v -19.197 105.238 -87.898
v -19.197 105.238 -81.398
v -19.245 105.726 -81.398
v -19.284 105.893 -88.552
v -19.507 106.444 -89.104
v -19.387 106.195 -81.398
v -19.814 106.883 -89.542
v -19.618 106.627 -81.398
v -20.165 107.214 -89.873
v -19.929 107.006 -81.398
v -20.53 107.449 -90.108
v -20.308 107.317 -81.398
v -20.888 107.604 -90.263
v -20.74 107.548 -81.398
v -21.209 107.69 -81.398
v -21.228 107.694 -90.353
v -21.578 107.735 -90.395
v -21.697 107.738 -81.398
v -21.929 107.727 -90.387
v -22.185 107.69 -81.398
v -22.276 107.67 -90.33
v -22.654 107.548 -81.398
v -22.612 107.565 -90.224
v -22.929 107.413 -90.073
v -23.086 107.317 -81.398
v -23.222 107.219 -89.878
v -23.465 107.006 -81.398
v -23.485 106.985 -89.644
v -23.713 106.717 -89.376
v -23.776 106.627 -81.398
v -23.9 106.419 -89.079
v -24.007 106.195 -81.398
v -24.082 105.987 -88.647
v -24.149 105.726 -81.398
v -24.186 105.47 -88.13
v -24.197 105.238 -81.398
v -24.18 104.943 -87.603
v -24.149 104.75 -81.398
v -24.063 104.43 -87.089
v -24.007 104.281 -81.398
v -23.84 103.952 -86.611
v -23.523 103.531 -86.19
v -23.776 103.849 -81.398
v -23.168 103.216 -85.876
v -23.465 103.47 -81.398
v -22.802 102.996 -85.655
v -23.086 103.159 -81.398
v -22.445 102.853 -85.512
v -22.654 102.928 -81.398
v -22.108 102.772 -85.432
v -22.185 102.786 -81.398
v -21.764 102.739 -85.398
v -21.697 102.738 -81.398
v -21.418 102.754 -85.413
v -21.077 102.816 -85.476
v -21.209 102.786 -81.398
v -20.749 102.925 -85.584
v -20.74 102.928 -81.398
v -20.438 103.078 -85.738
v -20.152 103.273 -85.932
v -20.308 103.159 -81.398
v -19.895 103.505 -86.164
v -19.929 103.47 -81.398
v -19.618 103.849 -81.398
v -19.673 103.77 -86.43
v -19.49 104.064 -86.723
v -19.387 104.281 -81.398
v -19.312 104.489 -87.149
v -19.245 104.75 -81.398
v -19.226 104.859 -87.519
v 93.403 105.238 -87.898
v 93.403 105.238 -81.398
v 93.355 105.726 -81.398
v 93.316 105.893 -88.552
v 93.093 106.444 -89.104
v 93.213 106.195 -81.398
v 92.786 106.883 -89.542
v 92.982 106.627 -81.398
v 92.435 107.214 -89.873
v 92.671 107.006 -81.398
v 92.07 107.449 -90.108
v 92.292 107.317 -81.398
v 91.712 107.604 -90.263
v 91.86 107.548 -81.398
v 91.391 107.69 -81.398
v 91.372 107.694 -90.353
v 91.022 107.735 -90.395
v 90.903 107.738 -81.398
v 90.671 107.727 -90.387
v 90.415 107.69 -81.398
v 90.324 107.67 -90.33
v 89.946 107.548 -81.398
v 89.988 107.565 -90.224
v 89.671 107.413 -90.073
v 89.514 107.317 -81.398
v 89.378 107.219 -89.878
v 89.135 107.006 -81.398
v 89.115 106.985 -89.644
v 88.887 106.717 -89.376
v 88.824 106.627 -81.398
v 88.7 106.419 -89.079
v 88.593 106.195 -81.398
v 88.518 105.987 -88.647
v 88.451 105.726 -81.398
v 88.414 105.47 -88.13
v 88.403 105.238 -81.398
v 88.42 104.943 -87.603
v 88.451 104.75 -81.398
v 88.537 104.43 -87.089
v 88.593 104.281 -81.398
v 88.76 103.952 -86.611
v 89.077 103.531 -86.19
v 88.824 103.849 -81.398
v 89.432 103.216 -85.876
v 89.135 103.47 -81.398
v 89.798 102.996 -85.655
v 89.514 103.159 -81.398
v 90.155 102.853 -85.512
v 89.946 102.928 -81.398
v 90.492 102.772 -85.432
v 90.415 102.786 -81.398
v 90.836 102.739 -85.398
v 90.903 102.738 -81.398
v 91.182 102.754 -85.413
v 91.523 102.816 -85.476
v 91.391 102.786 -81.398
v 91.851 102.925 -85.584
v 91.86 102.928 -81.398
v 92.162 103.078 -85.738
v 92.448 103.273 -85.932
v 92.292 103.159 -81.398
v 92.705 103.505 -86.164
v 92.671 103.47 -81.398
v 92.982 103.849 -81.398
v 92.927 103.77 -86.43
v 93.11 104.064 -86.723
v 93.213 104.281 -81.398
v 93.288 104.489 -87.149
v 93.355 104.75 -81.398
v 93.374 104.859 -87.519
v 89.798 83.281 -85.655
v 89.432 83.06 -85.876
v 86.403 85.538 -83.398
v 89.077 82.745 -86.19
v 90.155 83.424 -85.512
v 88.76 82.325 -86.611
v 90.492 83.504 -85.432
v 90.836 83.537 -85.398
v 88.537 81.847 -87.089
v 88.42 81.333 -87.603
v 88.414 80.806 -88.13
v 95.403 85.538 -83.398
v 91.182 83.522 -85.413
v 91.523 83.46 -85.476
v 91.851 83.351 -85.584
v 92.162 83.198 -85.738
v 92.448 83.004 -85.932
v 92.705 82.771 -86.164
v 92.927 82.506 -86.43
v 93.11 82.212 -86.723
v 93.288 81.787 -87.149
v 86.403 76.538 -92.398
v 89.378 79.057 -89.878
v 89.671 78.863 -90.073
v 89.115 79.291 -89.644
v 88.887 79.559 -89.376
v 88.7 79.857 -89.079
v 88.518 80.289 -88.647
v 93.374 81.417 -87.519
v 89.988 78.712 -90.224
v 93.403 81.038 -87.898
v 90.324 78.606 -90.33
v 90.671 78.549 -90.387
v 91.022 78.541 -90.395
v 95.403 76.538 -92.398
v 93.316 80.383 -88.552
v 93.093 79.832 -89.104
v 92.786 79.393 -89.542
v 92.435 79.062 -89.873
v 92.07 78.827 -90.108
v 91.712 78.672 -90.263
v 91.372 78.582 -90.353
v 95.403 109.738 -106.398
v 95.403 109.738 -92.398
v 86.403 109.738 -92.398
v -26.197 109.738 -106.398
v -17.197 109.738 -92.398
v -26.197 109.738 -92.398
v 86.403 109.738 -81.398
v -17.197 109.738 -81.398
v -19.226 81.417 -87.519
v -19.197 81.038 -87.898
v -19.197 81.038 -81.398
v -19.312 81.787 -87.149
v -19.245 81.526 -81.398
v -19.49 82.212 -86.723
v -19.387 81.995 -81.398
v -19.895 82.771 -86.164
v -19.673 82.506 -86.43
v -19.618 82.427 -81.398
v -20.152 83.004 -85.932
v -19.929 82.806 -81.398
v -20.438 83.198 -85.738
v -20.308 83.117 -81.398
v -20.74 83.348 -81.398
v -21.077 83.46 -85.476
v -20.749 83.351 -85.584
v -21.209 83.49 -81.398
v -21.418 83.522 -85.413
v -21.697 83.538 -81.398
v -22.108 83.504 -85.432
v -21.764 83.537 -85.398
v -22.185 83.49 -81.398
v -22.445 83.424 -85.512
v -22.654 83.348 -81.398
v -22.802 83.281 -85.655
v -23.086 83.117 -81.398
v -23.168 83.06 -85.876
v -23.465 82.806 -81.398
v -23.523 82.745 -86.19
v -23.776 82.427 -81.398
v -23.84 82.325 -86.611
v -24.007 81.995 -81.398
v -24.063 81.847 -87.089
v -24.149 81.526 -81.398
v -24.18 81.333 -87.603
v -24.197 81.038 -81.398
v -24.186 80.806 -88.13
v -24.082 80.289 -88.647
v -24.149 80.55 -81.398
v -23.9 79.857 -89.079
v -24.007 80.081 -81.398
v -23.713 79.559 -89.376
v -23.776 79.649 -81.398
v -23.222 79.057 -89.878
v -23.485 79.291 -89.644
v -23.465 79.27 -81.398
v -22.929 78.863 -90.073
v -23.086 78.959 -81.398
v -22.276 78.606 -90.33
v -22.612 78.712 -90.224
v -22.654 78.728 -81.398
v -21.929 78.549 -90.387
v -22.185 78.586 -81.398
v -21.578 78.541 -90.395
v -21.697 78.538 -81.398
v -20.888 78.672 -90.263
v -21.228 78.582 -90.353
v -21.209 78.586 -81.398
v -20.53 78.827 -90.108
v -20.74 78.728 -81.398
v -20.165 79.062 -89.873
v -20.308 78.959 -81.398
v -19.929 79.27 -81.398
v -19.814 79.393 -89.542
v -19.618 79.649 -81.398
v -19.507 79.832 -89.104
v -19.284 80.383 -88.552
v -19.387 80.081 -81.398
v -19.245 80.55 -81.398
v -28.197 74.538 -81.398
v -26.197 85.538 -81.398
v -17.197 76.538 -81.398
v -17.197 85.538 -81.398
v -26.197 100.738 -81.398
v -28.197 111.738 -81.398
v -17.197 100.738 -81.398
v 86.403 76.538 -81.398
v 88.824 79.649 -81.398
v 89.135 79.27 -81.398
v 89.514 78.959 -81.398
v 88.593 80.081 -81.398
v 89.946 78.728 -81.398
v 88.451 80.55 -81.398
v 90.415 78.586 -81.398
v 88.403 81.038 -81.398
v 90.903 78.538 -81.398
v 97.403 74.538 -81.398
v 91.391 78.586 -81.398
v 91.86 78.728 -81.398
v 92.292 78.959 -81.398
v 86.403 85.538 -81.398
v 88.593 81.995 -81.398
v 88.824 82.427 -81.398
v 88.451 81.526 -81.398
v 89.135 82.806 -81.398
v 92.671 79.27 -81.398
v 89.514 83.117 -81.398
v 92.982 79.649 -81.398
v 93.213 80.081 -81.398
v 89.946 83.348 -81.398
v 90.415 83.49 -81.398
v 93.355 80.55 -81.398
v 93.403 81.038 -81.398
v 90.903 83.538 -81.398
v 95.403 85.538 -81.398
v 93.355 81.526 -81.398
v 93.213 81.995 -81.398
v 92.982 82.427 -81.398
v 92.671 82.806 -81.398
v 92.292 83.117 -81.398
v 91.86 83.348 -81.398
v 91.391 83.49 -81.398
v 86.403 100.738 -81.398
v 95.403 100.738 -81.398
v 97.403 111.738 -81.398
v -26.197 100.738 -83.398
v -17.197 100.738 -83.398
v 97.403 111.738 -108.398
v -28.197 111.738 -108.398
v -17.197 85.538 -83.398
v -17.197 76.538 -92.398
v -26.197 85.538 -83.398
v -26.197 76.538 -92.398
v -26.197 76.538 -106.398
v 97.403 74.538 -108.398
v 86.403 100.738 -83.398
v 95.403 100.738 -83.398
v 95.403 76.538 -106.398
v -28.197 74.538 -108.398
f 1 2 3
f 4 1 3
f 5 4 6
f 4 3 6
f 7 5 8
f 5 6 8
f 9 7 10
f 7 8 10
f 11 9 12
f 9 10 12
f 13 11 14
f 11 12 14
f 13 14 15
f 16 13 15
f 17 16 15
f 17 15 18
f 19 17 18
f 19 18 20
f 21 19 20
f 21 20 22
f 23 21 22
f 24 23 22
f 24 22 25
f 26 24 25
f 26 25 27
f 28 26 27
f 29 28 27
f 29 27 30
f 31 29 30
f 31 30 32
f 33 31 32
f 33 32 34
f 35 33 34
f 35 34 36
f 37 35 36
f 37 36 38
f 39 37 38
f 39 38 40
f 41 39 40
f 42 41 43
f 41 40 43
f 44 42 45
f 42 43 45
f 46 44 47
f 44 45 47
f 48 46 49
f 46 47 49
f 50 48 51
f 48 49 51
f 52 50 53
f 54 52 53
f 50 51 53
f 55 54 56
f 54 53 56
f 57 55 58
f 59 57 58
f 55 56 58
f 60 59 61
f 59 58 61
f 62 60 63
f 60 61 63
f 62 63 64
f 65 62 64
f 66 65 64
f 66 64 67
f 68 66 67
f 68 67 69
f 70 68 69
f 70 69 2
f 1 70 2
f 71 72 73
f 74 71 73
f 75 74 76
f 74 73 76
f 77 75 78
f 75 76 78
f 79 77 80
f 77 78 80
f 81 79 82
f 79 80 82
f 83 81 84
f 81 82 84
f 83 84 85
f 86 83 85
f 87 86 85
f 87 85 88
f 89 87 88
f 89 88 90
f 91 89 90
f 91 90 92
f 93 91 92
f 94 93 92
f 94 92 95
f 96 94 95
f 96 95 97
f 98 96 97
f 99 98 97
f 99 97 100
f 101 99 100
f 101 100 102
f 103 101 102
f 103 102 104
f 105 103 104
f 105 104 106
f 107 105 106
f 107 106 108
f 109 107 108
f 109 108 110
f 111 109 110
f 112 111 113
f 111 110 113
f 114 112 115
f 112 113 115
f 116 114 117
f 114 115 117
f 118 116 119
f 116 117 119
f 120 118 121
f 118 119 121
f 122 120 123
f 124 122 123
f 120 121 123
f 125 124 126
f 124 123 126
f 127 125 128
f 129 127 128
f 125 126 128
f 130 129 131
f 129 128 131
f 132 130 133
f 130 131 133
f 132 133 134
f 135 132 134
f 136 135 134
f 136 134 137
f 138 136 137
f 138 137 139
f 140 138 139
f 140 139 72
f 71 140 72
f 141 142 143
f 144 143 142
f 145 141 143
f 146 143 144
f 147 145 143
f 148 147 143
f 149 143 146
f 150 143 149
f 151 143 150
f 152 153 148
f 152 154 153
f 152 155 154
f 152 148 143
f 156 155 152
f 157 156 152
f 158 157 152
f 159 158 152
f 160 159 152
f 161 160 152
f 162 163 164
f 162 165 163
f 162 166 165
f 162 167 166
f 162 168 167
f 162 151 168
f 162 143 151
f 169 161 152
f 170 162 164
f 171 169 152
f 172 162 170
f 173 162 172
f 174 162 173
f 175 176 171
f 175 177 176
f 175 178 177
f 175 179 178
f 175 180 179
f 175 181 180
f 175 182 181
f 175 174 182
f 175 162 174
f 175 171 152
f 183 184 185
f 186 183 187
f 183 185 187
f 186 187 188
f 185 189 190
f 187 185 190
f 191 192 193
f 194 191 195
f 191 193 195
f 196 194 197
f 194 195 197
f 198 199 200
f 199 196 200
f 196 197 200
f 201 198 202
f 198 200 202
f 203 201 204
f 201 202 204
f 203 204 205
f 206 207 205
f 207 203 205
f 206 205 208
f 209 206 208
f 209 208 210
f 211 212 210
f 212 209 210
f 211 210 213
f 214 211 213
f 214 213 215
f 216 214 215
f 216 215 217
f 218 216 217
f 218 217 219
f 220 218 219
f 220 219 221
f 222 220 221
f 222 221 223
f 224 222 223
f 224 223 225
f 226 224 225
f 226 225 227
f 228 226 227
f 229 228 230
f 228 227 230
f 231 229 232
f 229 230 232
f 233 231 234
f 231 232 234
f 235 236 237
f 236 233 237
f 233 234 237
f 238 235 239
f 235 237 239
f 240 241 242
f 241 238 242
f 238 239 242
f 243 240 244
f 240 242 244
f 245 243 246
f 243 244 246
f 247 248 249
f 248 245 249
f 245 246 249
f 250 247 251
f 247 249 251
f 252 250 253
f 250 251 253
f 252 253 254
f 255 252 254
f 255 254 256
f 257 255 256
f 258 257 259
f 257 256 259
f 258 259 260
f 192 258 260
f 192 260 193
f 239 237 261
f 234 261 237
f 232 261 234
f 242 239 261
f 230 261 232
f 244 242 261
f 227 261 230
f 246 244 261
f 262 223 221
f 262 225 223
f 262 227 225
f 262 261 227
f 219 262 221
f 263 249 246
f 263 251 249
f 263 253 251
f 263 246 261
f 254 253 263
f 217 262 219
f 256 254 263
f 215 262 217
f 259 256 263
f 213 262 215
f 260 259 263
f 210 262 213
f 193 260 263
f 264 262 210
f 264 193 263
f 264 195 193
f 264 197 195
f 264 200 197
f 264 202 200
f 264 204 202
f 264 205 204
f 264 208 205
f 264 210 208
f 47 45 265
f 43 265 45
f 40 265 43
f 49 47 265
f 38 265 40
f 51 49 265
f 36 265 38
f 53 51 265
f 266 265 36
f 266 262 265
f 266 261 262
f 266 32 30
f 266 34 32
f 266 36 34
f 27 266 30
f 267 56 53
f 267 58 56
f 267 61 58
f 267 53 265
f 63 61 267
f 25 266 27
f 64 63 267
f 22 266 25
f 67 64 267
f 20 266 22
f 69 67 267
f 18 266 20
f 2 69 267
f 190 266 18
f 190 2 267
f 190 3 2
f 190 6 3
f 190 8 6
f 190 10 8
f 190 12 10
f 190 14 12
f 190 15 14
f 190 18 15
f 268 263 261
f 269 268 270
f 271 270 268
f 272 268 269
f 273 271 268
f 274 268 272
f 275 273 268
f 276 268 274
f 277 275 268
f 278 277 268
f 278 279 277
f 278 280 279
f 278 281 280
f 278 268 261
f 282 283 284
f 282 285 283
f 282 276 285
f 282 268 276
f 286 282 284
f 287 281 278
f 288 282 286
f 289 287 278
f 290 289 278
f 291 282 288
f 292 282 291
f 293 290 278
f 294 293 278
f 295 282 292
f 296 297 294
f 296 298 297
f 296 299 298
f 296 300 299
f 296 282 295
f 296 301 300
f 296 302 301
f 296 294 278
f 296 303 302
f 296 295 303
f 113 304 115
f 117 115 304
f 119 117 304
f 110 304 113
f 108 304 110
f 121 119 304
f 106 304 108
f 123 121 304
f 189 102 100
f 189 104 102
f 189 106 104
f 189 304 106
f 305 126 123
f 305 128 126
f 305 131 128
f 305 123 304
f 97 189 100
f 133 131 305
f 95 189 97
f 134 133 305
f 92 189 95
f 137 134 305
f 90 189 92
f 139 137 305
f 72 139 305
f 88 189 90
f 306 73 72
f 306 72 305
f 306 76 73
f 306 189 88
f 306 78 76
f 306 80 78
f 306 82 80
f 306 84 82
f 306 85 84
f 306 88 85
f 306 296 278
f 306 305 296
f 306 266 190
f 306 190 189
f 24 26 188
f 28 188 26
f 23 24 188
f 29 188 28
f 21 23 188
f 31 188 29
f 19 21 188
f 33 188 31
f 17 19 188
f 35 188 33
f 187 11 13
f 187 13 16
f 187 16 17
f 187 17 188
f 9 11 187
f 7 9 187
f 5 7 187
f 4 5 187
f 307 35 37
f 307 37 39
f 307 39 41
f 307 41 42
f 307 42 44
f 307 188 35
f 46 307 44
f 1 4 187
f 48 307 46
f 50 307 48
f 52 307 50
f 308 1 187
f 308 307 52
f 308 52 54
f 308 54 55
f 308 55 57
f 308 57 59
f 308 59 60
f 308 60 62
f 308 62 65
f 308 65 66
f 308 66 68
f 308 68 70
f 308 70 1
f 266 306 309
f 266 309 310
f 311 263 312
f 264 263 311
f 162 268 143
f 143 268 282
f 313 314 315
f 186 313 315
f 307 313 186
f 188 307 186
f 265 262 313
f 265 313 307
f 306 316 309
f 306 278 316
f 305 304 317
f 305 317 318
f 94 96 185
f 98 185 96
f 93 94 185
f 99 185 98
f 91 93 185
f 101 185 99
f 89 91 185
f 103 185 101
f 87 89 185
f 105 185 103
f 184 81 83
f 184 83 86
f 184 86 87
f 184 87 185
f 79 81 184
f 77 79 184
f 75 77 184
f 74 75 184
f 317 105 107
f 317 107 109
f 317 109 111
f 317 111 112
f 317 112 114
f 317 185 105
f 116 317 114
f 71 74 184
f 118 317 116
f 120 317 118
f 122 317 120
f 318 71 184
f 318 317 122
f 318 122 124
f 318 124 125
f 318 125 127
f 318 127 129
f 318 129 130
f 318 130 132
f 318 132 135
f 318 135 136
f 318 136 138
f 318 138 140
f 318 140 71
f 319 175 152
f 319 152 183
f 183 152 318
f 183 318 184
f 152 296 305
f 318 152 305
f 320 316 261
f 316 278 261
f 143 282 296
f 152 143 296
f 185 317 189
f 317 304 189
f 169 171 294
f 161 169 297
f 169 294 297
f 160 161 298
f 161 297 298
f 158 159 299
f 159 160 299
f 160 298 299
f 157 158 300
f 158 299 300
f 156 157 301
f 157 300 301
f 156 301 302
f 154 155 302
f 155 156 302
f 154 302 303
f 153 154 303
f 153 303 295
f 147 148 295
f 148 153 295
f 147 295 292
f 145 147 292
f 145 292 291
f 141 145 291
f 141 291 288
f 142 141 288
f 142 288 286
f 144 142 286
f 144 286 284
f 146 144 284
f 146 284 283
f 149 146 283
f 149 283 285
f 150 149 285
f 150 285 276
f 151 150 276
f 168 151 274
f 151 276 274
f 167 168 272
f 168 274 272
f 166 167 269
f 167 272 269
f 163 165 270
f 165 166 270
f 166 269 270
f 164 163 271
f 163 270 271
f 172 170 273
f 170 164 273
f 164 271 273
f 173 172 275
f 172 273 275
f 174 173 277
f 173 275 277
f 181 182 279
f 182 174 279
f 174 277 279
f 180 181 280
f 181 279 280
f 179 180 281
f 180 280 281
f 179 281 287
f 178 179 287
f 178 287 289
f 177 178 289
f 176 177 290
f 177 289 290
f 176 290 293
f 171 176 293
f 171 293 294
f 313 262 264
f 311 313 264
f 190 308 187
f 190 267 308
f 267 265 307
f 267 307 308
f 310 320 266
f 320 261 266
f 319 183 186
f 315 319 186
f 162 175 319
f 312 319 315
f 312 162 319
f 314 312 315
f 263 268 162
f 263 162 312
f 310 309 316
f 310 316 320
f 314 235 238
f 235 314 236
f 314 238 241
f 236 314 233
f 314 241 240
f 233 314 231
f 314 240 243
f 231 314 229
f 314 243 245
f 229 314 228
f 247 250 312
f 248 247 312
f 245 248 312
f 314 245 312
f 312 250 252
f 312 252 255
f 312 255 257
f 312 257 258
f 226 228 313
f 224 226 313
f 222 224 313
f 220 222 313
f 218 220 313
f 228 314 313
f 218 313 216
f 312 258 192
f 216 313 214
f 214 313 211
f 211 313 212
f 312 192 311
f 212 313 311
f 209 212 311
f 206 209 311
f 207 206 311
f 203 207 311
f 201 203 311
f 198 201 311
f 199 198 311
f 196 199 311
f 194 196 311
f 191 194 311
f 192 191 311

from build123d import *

# Parameters (mm, degrees)
SKETCH1_W           = 125.6
SKETCH1_H           = 37.2
SKETCH1_W_2         = 121.6
SKETCH1_H_2         = 33.2
BOSS_EXTRUDE1_DEPTH = 25
SKETCH2_W           = 125.6
SKETCH2_H           = 37.2
BOSS_EXTRUDE2_DEPTH = 2
SKETCH3_W           = 9
SKETCH3_H           = 9
BOSS_EXTRUDE3_DEPTH = 2
CHAMFER1_SIZE       = 9
SKETCH4_R           = 2.5
CUT_EXTRUDE1_DEPTH  = 15


with BuildPart() as part:
    # Sketch1 → Boss-Extrude1 (new body)
    with BuildSketch(Plane(origin=(0, 0, -81.397696965), x_dir=(-1, 0, 0), z_dir=(0, 0, -1))):
        with Locations((-34.603078278, 93.138059859)):
            Rectangle(SKETCH1_W, SKETCH1_H)
        with Locations((-34.603078278, 93.138059859)):
            Rectangle(SKETCH1_W_2, SKETCH1_H_2, mode=Mode.SUBTRACT)
    extrude(amount=BOSS_EXTRUDE1_DEPTH)

    # Sketch2 → Boss-Extrude2 (add)
    with BuildSketch(Plane(origin=(0, 0, -106.397696965), x_dir=(-1, 0, 0), z_dir=(0, 0, -1))):
        with Locations((-34.603078278, 93.138059859)):
            Rectangle(SKETCH2_W, SKETCH2_H)
    extrude(amount=BOSS_EXTRUDE2_DEPTH)

    # Sketch3 → Boss-Extrude3 (add)
    with BuildSketch(Plane.XY.offset(-81.397696965)):
        with Locations((90.903078278, 105.238059859)):
            Rectangle(SKETCH3_W, SKETCH3_H)
        with Locations((90.903078278, 81.038059859)):
            Rectangle(SKETCH3_W, SKETCH3_H)
        with Locations((-21.696921722, 105.238059859)):
            Rectangle(SKETCH3_W, SKETCH3_H)
        with Locations((-21.696921722, 81.038059859)):
            Rectangle(SKETCH3_W, SKETCH3_H)
    extrude(amount=-BOSS_EXTRUDE3_DEPTH)

    # Chamfer1
    chamfer1_edges = [part.edges().sort_by_distance(p)[0] for p in [
        (-21.696921722, 76.538059859, -83.397696965),
        (90.903078278, 76.538059859, -83.397696965),
        (90.903078278, 109.738059859, -83.397696965),
        (-21.696921722, 109.738059859, -83.397696965),
    ]]
    chamfer(chamfer1_edges, length=CHAMFER1_SIZE - 0.0001)  # a hair under: the kernel refuses the full size

    # Sketch4 → Cut-Extrude1 (cut)
    with BuildSketch(Plane.XY.offset(-81.397696965)):
        with Locations((-21.696921722, 105.238059859)):
            Circle(SKETCH4_R)
        with Locations((-21.696921722, 81.038059859)):
            Circle(SKETCH4_R)
        with Locations((90.903078278, 81.038059859)):
            Circle(SKETCH4_R)
        with Locations((90.903078278, 105.238059859)):
            Circle(SKETCH4_R)
    extrude(amount=-CUT_EXTRUDE1_DEPTH, mode=Mode.SUBTRACT)


solid = part.part
